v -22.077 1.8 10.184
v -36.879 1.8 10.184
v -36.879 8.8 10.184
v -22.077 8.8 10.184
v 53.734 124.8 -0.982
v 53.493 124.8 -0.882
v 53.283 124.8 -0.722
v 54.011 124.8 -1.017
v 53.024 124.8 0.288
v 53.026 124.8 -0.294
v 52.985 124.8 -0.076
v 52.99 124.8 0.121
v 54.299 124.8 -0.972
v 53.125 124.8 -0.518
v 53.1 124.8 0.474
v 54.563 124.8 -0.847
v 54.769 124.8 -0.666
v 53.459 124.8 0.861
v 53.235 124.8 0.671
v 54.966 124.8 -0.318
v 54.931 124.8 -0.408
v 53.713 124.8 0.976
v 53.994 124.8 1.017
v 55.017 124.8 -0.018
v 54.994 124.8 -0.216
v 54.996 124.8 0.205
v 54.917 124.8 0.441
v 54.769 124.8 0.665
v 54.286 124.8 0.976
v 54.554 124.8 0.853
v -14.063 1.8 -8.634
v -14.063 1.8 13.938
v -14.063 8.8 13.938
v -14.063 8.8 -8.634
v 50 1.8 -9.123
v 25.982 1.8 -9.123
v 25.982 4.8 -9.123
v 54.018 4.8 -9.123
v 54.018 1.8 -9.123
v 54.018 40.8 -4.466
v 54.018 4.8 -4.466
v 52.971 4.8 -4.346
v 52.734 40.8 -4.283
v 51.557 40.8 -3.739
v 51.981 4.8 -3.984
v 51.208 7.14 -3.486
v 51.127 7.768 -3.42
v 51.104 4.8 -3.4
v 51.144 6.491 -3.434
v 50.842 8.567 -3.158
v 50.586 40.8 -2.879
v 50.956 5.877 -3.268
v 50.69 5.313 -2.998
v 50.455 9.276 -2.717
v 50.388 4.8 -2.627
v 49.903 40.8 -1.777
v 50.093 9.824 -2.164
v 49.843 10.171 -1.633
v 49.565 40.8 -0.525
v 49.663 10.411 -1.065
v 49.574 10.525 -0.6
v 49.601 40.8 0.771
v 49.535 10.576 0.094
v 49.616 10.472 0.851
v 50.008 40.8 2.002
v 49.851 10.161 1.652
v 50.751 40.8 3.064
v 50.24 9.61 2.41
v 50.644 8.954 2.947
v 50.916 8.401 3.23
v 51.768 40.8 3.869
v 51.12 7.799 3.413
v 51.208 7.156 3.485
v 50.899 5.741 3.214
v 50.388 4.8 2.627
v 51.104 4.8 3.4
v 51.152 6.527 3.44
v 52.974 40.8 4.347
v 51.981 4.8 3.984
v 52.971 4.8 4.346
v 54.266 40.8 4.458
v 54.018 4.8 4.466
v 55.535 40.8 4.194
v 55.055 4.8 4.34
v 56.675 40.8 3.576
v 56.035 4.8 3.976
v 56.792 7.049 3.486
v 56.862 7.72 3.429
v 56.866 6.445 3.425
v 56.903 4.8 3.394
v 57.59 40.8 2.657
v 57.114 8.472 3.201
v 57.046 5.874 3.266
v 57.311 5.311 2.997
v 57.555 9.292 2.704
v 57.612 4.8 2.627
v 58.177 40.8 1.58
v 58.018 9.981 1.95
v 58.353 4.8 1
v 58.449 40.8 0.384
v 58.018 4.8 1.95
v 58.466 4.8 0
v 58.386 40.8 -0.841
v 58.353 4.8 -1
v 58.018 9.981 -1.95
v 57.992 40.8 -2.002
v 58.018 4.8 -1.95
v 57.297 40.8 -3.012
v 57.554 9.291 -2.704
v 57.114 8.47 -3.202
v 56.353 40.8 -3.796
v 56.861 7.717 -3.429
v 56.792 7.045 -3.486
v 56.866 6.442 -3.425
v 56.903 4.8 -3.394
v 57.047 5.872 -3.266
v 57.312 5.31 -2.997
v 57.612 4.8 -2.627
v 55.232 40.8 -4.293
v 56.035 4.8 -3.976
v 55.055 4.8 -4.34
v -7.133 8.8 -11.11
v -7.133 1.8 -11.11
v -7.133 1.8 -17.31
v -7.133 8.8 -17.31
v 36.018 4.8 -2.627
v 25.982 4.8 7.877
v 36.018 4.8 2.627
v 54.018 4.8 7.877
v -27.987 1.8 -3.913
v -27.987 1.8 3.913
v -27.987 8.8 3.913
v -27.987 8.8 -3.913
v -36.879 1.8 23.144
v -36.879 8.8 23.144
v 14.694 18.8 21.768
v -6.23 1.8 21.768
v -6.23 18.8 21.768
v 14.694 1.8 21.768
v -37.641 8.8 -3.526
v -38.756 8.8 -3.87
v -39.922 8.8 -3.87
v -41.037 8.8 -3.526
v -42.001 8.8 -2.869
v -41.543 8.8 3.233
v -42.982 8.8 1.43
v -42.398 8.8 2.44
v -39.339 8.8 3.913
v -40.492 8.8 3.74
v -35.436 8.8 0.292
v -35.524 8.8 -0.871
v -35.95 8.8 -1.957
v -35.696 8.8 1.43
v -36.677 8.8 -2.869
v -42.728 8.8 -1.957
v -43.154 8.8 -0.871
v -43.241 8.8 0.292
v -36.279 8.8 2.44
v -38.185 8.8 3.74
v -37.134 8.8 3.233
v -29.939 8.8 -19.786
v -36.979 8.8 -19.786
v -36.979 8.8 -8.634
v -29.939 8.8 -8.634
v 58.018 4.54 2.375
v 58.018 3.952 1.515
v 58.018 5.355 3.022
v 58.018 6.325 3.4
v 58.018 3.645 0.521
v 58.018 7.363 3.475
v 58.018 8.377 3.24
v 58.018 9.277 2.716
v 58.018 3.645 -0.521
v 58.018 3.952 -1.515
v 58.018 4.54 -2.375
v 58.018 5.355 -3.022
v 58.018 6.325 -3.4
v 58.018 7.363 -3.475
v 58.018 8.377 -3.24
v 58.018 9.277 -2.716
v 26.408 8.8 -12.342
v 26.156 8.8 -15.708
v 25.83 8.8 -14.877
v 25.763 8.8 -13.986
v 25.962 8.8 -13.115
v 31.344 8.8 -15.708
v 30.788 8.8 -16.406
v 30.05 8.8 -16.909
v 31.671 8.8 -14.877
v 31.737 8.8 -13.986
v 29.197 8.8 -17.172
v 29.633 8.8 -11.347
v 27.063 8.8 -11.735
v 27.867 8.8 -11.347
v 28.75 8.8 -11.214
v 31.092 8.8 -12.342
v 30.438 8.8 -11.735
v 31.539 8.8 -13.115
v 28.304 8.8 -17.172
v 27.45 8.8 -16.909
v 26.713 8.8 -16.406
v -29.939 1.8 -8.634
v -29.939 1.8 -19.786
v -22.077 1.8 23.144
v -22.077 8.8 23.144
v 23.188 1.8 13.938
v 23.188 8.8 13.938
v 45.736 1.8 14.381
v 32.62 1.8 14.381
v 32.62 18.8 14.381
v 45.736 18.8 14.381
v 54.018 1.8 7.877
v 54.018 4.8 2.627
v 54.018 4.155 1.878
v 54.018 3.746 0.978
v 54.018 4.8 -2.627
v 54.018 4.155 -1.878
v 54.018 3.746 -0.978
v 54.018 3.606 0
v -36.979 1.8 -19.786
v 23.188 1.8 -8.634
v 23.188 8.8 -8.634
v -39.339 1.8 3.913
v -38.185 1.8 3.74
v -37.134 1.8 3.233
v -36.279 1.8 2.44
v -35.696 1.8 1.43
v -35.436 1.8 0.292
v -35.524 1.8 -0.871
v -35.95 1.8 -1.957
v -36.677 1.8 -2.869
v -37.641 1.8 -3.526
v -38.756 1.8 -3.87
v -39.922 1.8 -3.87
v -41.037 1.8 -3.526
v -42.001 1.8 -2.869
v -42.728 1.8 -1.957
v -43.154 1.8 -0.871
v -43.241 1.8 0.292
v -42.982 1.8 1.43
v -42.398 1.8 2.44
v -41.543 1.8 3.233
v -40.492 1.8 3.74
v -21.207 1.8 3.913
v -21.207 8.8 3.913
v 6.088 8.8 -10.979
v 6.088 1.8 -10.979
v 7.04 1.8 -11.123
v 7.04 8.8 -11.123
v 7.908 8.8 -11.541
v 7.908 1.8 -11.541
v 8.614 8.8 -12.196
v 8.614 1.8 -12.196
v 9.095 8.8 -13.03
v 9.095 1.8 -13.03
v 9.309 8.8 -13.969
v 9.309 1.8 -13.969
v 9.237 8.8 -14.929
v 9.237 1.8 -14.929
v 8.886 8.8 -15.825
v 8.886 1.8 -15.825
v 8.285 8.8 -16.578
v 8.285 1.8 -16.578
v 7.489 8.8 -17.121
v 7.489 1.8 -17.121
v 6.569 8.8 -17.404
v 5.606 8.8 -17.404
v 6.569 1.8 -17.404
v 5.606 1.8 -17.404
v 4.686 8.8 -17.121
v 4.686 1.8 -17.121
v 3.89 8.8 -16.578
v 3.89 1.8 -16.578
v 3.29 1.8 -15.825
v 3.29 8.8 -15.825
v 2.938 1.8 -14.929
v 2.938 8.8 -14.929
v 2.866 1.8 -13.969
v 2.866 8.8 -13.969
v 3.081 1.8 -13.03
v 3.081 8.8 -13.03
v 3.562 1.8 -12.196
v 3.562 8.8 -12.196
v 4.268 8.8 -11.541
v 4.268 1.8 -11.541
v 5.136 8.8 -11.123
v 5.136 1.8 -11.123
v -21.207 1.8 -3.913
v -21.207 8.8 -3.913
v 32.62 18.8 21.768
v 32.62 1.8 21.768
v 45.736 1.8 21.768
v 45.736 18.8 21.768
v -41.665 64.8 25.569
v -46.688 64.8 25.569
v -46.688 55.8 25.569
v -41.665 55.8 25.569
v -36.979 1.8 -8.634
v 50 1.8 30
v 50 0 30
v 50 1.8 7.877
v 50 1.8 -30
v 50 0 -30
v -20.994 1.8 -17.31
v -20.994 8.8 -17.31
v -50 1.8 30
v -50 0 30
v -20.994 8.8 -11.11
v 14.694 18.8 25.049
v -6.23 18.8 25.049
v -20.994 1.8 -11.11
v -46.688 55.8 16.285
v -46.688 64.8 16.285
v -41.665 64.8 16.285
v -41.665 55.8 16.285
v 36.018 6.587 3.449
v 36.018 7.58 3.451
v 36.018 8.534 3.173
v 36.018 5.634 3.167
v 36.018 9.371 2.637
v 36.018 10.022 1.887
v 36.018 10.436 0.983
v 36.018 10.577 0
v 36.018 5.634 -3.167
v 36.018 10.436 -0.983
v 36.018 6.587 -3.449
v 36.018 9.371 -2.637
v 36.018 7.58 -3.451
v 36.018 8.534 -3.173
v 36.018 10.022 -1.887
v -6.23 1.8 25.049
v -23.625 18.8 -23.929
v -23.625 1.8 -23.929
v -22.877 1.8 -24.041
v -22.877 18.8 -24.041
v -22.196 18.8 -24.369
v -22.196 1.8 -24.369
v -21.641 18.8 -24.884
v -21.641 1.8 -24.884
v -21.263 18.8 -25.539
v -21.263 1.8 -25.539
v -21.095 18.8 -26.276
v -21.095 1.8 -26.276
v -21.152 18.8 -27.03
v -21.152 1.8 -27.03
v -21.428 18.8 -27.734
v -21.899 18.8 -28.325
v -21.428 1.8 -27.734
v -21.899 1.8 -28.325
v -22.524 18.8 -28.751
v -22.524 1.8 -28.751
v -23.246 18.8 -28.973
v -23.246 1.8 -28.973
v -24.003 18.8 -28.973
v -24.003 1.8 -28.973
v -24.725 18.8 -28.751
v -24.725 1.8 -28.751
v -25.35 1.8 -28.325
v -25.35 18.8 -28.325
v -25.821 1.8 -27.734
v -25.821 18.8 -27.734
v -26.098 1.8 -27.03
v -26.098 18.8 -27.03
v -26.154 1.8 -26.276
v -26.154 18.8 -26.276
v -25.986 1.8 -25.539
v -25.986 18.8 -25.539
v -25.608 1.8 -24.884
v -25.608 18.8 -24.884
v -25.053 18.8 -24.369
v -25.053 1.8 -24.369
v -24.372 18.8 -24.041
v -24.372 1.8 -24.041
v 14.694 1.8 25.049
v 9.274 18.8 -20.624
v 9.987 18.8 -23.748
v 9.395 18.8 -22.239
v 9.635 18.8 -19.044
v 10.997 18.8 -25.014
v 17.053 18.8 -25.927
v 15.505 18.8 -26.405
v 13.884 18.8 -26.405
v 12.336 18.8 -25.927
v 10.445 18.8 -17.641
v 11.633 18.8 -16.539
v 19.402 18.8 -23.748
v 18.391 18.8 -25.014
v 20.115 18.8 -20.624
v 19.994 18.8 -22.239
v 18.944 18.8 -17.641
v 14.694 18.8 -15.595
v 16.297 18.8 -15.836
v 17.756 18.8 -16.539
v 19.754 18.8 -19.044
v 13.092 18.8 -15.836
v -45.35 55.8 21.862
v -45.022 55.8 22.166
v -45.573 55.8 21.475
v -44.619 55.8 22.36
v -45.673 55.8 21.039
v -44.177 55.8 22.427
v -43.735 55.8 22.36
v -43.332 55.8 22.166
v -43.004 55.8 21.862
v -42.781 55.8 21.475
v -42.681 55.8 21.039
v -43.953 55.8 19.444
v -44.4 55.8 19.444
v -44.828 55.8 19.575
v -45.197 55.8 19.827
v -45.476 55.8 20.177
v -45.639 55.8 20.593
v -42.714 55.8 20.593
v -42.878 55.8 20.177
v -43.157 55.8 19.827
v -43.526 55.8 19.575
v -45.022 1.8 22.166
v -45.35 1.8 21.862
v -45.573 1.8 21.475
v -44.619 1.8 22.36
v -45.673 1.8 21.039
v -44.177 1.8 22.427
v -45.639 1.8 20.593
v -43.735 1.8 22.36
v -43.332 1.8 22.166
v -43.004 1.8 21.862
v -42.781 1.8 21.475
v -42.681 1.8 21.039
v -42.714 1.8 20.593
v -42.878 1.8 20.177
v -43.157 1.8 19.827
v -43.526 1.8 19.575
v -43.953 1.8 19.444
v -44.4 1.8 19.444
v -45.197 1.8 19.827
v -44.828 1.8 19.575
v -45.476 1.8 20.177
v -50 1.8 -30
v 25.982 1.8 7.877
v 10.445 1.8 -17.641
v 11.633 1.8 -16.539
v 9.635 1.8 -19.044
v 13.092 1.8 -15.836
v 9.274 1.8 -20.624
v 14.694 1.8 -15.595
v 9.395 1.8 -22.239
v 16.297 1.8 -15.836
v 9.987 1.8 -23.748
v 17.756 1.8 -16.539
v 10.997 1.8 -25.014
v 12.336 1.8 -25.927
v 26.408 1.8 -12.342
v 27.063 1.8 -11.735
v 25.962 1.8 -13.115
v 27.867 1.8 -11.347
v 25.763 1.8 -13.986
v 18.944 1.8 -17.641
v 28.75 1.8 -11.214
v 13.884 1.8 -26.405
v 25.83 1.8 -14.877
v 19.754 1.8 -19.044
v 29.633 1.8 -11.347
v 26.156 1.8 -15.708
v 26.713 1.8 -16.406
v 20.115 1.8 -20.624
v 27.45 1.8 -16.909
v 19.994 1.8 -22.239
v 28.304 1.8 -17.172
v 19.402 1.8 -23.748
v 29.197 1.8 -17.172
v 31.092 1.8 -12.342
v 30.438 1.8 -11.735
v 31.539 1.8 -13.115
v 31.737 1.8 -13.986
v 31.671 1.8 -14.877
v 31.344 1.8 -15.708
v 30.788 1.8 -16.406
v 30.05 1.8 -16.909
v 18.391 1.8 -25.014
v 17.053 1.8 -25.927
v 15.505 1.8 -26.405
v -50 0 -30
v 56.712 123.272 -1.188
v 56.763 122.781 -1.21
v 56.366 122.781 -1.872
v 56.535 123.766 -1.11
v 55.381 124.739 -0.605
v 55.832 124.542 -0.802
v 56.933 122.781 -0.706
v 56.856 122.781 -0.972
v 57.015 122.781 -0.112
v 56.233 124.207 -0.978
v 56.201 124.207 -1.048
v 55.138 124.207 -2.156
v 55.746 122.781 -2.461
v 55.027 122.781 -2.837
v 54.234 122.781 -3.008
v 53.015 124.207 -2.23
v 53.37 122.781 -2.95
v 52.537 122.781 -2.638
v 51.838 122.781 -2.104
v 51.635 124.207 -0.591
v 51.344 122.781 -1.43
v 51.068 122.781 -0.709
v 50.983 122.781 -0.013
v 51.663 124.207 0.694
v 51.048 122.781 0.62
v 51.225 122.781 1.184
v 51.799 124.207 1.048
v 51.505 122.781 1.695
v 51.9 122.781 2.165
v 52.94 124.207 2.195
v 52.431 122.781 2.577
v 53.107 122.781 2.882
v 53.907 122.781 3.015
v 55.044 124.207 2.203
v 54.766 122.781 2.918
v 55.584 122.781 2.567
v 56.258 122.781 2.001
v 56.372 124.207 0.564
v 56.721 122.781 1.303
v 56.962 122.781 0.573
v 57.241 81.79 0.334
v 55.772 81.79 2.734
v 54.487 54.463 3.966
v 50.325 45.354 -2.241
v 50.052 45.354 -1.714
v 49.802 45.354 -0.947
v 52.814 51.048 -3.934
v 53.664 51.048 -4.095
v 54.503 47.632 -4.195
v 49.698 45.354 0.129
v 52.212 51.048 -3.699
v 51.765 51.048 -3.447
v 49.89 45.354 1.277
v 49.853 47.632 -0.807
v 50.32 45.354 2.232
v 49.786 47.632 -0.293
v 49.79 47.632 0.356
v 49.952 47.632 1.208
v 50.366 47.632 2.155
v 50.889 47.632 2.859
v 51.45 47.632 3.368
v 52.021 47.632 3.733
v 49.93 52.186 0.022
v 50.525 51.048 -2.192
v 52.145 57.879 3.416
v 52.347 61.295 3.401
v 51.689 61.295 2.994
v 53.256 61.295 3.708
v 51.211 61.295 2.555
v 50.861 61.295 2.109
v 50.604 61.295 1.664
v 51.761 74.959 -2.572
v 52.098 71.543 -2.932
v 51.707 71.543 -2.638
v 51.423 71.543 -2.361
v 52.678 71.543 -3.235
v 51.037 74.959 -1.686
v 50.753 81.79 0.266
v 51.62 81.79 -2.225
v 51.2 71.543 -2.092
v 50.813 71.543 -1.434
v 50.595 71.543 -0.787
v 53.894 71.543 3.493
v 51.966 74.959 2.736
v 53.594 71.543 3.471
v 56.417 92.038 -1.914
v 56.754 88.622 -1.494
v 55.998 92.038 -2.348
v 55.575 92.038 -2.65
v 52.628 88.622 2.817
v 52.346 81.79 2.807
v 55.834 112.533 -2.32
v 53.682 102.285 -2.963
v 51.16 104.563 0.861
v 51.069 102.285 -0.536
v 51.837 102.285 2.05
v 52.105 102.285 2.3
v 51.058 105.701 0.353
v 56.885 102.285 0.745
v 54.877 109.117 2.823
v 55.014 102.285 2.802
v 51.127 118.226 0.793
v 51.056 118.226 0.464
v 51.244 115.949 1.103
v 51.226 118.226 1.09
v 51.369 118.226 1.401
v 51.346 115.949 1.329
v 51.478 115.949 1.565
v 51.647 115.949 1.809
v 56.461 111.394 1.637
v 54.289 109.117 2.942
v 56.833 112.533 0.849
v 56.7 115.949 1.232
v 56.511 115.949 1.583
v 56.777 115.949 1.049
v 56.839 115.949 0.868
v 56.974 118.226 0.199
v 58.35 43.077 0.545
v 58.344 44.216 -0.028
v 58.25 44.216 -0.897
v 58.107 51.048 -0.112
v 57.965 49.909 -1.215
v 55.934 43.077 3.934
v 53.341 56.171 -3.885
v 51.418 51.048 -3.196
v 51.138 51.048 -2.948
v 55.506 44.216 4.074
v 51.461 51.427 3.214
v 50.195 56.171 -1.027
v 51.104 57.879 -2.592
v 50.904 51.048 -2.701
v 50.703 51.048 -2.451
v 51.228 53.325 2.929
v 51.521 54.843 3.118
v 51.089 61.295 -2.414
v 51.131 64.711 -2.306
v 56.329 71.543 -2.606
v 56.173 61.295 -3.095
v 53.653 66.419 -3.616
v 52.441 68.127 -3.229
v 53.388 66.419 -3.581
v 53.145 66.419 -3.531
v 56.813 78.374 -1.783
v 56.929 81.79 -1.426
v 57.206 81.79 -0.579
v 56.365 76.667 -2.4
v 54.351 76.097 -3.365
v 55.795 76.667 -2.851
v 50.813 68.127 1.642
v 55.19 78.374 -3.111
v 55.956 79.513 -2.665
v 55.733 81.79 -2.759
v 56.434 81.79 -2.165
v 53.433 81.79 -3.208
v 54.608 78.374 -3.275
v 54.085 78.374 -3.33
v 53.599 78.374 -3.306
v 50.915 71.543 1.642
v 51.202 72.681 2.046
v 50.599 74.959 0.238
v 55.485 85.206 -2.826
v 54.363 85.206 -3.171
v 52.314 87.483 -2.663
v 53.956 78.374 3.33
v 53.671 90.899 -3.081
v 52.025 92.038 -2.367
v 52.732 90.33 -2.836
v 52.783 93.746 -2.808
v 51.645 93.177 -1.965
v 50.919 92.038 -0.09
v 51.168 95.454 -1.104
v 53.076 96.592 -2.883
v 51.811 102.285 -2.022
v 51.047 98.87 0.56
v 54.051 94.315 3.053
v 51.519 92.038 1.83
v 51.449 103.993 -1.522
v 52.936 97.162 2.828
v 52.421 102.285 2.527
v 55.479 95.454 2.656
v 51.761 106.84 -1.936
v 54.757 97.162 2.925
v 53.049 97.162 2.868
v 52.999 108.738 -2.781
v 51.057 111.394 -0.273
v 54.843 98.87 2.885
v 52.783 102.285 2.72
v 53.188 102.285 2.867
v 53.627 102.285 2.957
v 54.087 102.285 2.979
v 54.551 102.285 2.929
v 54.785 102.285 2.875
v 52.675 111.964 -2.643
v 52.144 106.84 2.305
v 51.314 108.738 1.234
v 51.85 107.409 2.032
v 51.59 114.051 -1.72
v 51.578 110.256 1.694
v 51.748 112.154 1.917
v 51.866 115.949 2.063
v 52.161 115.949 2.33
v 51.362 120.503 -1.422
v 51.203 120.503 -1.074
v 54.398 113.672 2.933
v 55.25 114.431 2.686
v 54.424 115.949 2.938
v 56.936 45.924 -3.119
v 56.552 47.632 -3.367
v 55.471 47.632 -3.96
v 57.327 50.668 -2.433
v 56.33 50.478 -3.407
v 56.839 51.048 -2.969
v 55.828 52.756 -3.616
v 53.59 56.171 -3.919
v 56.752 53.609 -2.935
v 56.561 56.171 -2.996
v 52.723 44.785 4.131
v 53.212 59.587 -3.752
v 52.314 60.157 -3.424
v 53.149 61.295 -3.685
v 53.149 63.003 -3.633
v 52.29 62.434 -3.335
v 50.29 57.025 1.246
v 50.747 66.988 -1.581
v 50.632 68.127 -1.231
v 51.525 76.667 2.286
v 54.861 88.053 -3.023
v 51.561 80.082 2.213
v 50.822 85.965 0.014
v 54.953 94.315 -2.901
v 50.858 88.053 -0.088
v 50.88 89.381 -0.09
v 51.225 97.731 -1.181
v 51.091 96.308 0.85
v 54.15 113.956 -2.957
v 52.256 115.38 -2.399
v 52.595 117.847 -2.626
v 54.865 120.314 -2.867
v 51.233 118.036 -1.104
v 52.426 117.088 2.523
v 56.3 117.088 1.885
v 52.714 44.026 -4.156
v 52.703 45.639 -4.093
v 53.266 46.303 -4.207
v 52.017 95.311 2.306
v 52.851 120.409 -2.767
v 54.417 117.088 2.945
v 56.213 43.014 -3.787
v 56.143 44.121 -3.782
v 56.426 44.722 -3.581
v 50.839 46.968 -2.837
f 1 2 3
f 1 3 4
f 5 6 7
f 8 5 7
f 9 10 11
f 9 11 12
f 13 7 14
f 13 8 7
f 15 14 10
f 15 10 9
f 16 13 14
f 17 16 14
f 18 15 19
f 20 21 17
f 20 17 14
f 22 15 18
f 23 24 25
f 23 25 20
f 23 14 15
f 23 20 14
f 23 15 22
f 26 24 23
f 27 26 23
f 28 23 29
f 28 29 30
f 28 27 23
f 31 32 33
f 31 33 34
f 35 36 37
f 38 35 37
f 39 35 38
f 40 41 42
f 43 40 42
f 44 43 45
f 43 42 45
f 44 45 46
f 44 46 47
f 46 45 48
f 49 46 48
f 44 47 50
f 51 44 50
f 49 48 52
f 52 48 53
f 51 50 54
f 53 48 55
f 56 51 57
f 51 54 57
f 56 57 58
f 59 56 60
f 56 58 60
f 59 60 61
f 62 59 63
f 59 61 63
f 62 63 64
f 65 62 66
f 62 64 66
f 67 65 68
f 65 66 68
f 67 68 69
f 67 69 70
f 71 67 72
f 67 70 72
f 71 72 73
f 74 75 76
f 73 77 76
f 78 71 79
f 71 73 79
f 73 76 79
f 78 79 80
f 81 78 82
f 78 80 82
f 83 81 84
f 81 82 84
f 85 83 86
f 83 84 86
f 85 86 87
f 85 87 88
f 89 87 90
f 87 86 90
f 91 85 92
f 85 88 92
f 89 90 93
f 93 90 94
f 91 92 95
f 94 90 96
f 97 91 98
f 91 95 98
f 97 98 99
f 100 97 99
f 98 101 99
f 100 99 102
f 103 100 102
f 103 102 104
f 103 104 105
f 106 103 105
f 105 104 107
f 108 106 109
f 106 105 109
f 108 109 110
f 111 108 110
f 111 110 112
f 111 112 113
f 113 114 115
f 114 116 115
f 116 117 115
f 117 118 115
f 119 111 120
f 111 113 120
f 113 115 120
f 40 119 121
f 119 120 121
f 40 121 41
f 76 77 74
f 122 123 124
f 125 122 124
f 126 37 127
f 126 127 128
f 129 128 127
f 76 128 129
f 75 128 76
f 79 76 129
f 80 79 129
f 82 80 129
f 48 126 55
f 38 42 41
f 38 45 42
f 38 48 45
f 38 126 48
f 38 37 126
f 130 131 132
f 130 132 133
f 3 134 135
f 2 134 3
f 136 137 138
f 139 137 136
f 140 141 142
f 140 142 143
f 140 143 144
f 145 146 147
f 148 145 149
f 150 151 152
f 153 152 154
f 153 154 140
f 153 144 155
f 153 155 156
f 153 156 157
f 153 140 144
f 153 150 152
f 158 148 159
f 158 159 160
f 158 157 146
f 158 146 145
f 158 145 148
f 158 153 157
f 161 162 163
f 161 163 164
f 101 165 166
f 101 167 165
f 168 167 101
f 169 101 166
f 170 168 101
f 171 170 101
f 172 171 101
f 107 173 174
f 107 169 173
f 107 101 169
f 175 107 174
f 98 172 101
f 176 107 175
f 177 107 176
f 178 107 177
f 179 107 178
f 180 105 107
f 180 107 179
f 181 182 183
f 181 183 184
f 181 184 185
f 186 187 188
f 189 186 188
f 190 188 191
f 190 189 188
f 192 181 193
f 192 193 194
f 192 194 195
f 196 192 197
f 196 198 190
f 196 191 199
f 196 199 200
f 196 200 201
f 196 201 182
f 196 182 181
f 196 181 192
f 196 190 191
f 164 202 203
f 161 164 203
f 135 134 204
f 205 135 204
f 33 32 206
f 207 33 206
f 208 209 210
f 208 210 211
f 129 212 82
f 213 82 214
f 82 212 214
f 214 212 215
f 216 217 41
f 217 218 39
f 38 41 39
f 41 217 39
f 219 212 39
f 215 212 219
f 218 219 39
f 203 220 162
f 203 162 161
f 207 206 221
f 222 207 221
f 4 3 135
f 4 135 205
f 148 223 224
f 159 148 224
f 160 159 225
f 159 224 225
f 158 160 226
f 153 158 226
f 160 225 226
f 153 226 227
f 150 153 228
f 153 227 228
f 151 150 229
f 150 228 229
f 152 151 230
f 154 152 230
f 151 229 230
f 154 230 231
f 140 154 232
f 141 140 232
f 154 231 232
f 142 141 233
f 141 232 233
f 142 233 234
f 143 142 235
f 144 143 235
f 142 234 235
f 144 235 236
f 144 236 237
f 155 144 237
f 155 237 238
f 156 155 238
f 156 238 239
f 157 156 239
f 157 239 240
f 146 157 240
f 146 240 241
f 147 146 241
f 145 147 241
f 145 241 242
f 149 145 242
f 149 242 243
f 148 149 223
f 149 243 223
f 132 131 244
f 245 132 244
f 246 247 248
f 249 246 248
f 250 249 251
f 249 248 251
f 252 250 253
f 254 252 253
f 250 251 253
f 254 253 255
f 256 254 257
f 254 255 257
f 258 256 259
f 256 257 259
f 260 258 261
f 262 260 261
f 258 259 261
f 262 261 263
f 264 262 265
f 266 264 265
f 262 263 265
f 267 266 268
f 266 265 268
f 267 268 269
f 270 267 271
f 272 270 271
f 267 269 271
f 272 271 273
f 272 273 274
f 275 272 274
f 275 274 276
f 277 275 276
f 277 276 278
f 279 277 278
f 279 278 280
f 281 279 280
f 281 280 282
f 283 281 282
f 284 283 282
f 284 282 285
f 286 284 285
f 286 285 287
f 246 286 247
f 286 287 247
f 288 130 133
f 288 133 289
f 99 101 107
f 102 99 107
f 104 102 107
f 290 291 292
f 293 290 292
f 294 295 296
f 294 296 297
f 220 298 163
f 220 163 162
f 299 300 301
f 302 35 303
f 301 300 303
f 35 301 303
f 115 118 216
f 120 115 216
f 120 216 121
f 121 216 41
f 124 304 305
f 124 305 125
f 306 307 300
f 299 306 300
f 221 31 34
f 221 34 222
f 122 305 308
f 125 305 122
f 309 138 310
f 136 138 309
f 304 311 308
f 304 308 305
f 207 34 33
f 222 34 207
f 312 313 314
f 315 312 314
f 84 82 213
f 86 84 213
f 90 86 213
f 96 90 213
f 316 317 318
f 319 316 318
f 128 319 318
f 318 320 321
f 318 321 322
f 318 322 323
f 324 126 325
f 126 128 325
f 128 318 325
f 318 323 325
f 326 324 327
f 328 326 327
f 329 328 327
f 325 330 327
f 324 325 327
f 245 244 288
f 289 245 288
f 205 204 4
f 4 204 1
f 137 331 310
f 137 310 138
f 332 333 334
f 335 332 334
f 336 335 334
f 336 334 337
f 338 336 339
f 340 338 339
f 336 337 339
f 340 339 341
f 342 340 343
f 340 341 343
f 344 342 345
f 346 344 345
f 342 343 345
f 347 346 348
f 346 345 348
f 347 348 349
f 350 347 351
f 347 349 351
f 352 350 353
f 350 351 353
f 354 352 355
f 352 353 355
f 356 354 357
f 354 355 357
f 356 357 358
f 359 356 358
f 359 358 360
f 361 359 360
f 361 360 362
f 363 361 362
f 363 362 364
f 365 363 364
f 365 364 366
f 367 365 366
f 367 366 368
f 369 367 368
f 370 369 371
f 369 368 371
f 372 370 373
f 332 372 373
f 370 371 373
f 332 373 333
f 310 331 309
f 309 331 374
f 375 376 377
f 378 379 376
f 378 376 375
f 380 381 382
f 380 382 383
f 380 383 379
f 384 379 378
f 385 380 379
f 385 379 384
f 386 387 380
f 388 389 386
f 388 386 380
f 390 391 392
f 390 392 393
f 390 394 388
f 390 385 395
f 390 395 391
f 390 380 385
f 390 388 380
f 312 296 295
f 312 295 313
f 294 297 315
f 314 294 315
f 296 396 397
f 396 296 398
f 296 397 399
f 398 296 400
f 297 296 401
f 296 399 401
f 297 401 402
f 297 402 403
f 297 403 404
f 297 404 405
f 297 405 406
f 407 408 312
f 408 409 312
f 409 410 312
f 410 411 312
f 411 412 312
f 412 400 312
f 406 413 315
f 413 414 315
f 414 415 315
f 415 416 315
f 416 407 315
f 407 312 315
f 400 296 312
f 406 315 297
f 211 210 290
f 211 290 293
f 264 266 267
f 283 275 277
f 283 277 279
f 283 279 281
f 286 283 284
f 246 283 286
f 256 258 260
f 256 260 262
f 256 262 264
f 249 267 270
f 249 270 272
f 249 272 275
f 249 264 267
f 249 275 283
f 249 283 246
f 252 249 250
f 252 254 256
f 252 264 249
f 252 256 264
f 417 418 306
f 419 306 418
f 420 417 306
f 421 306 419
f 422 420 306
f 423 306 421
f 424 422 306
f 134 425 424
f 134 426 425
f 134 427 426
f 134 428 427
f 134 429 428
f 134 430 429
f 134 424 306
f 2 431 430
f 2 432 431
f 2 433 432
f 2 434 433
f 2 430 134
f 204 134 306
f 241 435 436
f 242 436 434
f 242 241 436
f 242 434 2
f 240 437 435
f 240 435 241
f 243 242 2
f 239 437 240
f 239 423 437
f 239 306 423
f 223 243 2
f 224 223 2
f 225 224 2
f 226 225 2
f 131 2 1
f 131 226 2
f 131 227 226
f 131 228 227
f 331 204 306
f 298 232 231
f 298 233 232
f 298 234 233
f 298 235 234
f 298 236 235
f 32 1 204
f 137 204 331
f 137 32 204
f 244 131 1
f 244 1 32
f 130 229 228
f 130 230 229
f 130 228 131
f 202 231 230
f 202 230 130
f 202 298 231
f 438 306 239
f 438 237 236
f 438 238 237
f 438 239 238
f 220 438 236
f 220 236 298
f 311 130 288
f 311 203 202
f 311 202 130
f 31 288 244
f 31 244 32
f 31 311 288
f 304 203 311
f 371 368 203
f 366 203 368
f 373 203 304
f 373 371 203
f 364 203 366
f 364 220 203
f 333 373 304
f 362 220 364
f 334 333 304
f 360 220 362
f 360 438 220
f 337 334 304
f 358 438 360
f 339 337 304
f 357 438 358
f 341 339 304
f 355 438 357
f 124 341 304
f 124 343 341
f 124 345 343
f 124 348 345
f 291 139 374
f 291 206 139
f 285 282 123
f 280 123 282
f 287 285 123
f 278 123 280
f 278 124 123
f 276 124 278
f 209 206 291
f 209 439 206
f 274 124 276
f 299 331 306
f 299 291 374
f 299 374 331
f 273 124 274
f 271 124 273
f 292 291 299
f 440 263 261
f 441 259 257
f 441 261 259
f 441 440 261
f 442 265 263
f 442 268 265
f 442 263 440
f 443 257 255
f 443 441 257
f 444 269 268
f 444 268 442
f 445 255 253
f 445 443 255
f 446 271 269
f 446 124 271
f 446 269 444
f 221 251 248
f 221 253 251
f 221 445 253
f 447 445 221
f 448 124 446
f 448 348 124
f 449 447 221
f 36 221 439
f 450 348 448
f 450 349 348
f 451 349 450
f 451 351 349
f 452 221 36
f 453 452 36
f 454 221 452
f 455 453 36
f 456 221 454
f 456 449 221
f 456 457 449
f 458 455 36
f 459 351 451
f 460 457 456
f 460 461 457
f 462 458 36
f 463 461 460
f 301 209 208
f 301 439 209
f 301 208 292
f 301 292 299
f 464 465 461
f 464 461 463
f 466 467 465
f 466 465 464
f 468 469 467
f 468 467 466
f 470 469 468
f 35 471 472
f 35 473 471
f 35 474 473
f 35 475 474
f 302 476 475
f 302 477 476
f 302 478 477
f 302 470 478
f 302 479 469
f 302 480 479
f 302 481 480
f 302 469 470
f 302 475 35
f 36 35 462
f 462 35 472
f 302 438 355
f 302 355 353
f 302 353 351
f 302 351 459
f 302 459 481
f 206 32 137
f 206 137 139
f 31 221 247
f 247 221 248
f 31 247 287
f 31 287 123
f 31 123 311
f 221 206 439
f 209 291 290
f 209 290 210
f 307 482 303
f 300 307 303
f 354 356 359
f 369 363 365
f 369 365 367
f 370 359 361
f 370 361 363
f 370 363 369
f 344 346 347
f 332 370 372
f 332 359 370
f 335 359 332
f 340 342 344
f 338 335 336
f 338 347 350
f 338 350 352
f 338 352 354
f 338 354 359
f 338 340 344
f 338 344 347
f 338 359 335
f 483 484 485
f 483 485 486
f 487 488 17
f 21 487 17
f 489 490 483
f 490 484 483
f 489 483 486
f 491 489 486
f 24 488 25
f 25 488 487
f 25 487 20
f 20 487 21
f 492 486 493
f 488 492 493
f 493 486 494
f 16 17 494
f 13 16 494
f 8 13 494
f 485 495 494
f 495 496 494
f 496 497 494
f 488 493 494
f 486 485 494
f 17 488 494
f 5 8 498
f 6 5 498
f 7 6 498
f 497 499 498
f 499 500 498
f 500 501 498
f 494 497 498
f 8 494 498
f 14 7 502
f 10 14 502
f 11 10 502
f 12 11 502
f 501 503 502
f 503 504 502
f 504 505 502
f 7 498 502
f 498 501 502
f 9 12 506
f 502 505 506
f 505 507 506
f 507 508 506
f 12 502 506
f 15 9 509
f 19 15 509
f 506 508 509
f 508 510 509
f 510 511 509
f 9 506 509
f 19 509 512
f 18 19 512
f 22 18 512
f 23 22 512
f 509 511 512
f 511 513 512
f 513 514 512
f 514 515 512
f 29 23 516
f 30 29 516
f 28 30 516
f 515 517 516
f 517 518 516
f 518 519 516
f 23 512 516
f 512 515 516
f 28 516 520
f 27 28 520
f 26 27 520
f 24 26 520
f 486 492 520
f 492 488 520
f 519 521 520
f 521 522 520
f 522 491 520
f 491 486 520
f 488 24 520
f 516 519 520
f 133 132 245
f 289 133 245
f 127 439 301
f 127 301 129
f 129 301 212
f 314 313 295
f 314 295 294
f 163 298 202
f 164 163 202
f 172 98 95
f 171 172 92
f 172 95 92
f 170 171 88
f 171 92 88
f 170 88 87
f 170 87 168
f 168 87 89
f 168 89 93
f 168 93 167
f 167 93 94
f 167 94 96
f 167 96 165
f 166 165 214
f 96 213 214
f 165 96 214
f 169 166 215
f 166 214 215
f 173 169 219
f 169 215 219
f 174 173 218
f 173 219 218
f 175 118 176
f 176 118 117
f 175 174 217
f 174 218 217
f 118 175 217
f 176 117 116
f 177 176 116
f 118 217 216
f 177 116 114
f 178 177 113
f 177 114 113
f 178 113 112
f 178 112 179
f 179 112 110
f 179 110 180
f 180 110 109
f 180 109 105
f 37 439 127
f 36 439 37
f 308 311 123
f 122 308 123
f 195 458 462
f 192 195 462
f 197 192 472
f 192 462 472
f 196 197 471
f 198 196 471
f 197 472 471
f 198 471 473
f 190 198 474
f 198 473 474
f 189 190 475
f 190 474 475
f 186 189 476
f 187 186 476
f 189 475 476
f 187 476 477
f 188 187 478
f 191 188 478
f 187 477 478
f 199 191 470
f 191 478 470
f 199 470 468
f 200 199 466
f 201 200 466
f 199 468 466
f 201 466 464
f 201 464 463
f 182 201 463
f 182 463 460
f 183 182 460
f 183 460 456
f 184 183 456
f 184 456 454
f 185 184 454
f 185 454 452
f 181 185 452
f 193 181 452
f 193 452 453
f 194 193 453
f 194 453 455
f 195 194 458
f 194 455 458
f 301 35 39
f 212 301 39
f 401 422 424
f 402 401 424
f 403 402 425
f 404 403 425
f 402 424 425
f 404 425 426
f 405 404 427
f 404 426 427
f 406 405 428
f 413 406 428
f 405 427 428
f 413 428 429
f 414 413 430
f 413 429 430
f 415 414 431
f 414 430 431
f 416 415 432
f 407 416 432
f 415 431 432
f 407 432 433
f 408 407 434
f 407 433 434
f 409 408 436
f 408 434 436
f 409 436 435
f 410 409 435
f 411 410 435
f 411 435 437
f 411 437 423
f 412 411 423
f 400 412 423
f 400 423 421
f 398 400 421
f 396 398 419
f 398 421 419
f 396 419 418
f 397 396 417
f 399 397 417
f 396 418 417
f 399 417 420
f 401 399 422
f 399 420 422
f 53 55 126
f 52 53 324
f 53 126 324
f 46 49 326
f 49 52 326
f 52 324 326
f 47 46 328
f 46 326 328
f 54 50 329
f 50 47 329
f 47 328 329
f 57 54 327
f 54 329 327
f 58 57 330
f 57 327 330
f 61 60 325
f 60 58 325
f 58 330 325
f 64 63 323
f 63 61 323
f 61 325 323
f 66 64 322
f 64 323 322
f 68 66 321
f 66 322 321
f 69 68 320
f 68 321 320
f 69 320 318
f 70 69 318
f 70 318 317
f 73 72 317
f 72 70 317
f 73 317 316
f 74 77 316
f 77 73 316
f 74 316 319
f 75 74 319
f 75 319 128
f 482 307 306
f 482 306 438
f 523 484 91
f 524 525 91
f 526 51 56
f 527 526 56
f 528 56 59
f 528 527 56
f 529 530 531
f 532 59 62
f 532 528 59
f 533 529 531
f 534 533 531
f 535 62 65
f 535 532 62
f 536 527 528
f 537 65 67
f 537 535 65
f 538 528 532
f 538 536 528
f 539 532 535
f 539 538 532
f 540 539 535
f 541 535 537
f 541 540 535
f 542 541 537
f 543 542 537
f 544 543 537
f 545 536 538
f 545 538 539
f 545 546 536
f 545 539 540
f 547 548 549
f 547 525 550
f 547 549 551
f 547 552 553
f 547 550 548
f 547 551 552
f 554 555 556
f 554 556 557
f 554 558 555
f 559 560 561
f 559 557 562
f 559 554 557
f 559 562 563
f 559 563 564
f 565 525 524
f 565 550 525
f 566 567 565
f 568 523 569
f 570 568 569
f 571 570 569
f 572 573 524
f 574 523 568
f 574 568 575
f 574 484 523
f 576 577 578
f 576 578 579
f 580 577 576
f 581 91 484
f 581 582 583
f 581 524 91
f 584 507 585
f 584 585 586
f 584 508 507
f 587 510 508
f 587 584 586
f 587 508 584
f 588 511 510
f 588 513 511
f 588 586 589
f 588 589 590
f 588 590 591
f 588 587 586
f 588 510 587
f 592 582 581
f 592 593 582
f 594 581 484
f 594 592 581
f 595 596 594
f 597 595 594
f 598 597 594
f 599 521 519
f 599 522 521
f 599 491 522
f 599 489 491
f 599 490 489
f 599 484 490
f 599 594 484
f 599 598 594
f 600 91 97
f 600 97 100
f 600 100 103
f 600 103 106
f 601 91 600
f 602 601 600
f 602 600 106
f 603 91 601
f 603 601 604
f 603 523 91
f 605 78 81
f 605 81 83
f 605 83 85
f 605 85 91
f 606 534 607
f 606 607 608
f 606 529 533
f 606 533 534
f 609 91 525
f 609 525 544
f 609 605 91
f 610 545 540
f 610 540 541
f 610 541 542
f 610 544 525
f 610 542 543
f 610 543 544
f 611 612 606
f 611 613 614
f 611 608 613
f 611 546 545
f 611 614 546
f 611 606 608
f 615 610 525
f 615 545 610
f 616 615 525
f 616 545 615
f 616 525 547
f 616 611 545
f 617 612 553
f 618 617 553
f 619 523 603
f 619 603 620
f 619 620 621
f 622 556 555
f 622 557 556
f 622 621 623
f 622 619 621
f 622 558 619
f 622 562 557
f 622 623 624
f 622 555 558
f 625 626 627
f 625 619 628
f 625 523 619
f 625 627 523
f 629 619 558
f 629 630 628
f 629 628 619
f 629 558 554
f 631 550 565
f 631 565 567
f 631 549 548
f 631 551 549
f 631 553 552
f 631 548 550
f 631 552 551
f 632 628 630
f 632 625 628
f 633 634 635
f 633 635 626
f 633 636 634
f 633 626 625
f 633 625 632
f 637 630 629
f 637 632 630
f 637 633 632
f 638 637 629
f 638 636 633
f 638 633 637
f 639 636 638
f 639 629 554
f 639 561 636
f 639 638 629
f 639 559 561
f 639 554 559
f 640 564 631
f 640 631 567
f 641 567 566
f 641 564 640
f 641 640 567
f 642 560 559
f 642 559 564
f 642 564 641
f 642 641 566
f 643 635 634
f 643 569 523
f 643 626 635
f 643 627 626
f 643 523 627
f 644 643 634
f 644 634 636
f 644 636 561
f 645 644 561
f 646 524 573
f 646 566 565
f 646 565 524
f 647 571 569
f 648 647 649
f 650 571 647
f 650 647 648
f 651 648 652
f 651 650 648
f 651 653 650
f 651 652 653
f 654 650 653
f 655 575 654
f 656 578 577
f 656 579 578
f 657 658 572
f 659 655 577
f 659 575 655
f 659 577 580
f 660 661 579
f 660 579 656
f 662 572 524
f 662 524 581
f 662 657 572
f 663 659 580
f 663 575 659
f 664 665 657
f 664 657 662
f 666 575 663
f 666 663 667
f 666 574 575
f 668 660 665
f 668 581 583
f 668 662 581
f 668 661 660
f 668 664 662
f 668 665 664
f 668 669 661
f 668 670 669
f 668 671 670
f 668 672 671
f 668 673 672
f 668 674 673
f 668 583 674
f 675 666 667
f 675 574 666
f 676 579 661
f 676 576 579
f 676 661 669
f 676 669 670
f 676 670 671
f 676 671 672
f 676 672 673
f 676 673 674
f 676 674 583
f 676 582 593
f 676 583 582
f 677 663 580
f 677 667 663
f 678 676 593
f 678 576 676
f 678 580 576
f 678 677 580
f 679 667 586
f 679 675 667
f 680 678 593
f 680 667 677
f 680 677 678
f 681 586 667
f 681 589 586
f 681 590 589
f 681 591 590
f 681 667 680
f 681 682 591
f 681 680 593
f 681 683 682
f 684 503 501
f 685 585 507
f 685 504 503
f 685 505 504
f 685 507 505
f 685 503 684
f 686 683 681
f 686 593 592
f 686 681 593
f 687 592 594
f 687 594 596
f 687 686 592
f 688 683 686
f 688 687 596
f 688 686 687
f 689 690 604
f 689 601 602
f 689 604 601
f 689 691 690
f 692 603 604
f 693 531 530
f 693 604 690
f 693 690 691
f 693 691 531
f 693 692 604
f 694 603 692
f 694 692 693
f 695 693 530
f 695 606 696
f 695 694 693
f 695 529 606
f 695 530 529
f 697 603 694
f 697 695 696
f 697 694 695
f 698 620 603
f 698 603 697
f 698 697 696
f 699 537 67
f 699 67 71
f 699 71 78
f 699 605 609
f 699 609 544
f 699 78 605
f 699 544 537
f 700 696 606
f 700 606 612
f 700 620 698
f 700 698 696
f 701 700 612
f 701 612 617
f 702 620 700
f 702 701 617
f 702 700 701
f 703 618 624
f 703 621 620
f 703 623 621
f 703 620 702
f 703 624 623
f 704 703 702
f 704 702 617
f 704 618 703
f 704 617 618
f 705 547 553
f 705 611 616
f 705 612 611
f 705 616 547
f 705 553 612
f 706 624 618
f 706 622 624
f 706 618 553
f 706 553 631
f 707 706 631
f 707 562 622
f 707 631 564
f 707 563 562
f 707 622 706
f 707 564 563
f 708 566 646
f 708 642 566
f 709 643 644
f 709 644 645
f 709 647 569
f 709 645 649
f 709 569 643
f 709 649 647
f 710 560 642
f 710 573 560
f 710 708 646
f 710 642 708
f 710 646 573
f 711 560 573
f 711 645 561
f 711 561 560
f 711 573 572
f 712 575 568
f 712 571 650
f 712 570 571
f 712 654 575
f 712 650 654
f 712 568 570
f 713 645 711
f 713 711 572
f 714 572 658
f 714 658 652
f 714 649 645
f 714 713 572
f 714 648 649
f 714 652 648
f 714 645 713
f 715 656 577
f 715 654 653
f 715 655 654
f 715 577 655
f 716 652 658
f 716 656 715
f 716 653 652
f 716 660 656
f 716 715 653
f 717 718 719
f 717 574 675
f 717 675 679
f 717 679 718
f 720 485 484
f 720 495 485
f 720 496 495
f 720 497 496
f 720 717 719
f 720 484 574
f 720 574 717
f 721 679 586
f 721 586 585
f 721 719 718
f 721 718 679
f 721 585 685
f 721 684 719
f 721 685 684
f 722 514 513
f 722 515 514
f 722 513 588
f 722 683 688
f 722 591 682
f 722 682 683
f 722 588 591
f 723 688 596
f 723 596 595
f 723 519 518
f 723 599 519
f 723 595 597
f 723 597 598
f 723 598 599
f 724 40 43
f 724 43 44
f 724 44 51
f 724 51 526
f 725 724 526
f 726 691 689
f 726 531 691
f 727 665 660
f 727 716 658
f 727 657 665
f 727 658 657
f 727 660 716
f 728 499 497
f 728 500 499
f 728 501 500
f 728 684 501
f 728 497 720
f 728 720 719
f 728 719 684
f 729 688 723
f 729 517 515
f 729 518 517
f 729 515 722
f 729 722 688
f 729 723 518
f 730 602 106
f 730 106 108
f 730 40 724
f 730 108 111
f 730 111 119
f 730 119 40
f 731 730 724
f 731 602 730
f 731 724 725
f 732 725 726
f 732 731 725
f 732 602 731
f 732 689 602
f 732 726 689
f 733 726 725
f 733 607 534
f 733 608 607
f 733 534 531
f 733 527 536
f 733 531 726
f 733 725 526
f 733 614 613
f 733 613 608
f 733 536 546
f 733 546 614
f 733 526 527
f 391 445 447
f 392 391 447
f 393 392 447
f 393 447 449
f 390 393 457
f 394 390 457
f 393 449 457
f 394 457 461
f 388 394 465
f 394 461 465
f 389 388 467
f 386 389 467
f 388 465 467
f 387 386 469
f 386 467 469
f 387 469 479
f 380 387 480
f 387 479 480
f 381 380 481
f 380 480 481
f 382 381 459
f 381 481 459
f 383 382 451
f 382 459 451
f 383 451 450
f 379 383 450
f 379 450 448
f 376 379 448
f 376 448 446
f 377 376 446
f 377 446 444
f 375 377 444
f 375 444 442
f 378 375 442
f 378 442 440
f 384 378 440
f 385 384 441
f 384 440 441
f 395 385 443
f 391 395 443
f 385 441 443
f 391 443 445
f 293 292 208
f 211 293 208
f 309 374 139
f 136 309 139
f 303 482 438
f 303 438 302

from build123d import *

# Parameters (mm, degrees)
SKETCH_1_W           = 100
SKETCH_1_H           = 60
EXTRUDE_1_DEPTH      = 1.8
SKETCH_2_W           = 28.035932228
SKETCH_2_H           = 17
EXTRUDE_2_DEPTH      = 3
SKETCH_3_R           = 4.4660261
EXTRUDE_3_DEPTH      = 36
FILLET_1_R           = 2
EXTRUDE_4_DEPTH      = 4
EXTRUDE_4_DEPTH_BACK = 18
SKETCH_5_R           = 3.485899794
SKETCH_6_R           = 1.5
EXTRUDE_5_DEPTH      = 54
SKETCH_7_W           = 5.022784178
SKETCH_7_H           = 9.283620646
EXTRUDE_6_DEPTH      = 9
SKETCH_8_R           = 2.995676271
SKETCH_8_R_2         = 3.913381196
SKETCH_8_R_3         = 3.23055129
SKETCH_8_W           = 14.80227989
SKETCH_8_H           = 12.960220437
SKETCH_8_W_2         = 37.251391954
SKETCH_8_H_2         = 22.572187892
SKETCH_8_W_3         = 7.03946311
SKETCH_8_H_3         = 11.152107008
SKETCH_8_W_4         = 13.860680023
SKETCH_8_H_4         = 6.200099882
SKETCH_8_W_5         = 6.780047866
SKETCH_8_H_5         = 7.826762392
EXTRUDE_7_DEPTH      = 7
SKETCH_9_R           = 5.435360368
SKETCH_9_R_2         = 2.536600753
SKETCH_9_W           = 13.115606058
SKETCH_9_H           = 7.387065748
SKETCH_9_W_2         = 20.924425377
SKETCH_9_H_2         = 3.280564091
EXTRUDE_8_DEPTH      = 17


with BuildPart() as part:
    # 草图1 → 凸台-拉伸1 (new body)
    with BuildSketch(Plane(origin=(0, 0, 0), x_dir=(1, 0, 0), z_dir=(0, 1, 0))):
        Rectangle(SKETCH_1_W, SKETCH_1_H)
    extrude(amount=EXTRUDE_1_DEPTH)

    # 草图2 → 凸台-拉伸2 (add)
    with BuildSketch(Plane(origin=(0, 1.8, 0), x_dir=(1, 0, 0), z_dir=(0, 1, 0))):
        with Locations((40, 0.62339544)):
            Rectangle(SKETCH_2_W, SKETCH_2_H)
    extrude(amount=EXTRUDE_2_DEPTH)

    # 草图3 → 凸台-拉伸3 (add)
    with BuildSketch(Plane(origin=(0, 4.8, 0), x_dir=(1, 0, 0), z_dir=(0, 1, 0))):
        with Locations(Location((54, 0, 0), (0, 0, 89.769507549))):
            Circle(SKETCH_3_R)
    extrude(amount=EXTRUDE_3_DEPTH)

    # 放样1: read off the stored shape, not the designer's step
    # 放样1: loft between two sections, ruled curve by curve
    loft_1_from = [
        Edge.make_bspline([(57.589860253, 40.8, 2.656744716), (62.903349686, 40.8, -4.52297579), (55.72362918, 40.8, -9.836465222), (50.410139747, 40.8, -2.656744716), (45.096650314, 40.8, 4.52297579), (52.27637082, 40.8, 9.836465222), (57.589860253, 40.8, 2.656744716)], [0, 0, 0, 0, 0.5, 0.5, 0.5, 1, 1, 1, 1], 3, [1, 0.333333333, 0.333333333, 1, 0.333333333, 0.333333333, 1]),
    ]
    loft_1_to = [
        Edge.make_bspline([(56.743086688, 124.8, -1.30542509), (54.132236508, 124.8, -6.791598467), (48.646063131, 124.8, -4.180748287), (51.256913312, 124.8, 1.30542509), (53.867763492, 124.8, 6.791598467), (59.353936869, 124.8, 4.180748287), (56.743086688, 124.8, -1.30542509)], [0, 0, 0, 0, 0.5, 0.5, 0.5, 1, 1, 1, 1], 3, [1, 0.333333333, 0.333333333, 1, 0.333333333, 0.333333333, 1]),
    ]
    loft_1 = Solid(Shell([*[Face.make_surface_from_curves(loft_1_from[k], loft_1_to[k]) for k in range(1)], Face(Wire(loft_1_from)), Face(Wire(loft_1_to))]))
    add(loft_1)

    # 圆角1
    fillet_1_edges = [part.edges().sort_by_distance(p)[0] for p in [
        (51.256913312, 124.8, 1.30542509),
    ]]
    fillet(fillet_1_edges, radius=FILLET_1_R)

    # 草图5 → 凸台-拉伸4 (add, two sides: drawn at the far end of the back side and taken through both)
    with BuildSketch(Plane(origin=(54.017966114, 0, 0), x_dir=(0, 0, -1), z_dir=(1, 0, 0)).offset(-EXTRUDE_4_DEPTH_BACK)):
        with Locations((0, 7.091500567)):
            Circle(SKETCH_5_R)
    extrude(amount=EXTRUDE_4_DEPTH + EXTRUDE_4_DEPTH_BACK)

    # 草图6 → 凸台-拉伸5 (add)
    with BuildSketch(Plane(origin=(0, 1.8, 0), x_dir=(1, 0, 0), z_dir=(0, 1, 0))):
        with Locations(Location((-44.176840226, -20.926898996, 0), (0, 0, 270))):
            Circle(SKETCH_6_R)
    extrude(amount=EXTRUDE_5_DEPTH)

    # 草图7 → 凸台-拉伸6 (add)
    with BuildSketch(Plane(origin=(0, 55.8, 0), x_dir=(1, 0, 0), z_dir=(0, 1, 0))):
        with Locations((-44.176840226, -20.926898996)):
            Rectangle(SKETCH_7_W, SKETCH_7_H)
    extrude(amount=EXTRUDE_6_DEPTH)

    # 草图8 → 凸台-拉伸7 (add)
    with BuildSketch(Plane(origin=(0, 1.8, 0), x_dir=(1, 0, 0), z_dir=(0, 1, 0))):
        with Locations(Location((28.750153934, 14.209939116, 0), (0, 0, 270))):
            Circle(SKETCH_8_R)
        with Locations(Location((-39.338854446, 0, 0), (0, 0, 270))):
            Circle(SKETCH_8_R_2)
        with Locations(Location((6.087776547, 14.209939116, 0), (0, 0, 270))):
            Circle(SKETCH_8_R_3)
        with Locations((-29.478201176, -16.663954757)):
            Rectangle(SKETCH_8_W, SKETCH_8_H)
        with Locations((4.562248459, -2.652208334)):
            Rectangle(SKETCH_8_W_2, SKETCH_8_H_2)
        with Locations((-33.458891008, 14.209939116)):
            Rectangle(SKETCH_8_W_3, SKETCH_8_H_3)
        with Locations((-14.063447519, 14.209939116)):
            Rectangle(SKETCH_8_W_4, SKETCH_8_H_4)
        with Locations((-24.597460964, 0)):
            Rectangle(SKETCH_8_W_5, SKETCH_8_H_5)
    extrude(amount=EXTRUDE_7_DEPTH)

    # 草图9 → 凸台-拉伸8 (add)
    with BuildSketch(Plane(origin=(0, 1.8, 0), x_dir=(1, 0, 0), z_dir=(0, 1, 0))):
        with Locations(Location((14.694438418, 21.029865225, 0), (0, 0, 270))):
            Circle(SKETCH_9_R)
        with Locations(Location((-23.624550245, 26.465225593, 0), (0, 0, 270))):
            Circle(SKETCH_9_R_2)
        with Locations((39.178063873, -18.07482194)):
            Rectangle(SKETCH_9_W, SKETCH_9_H)
        with Locations((4.232225729, -23.408636859)):
            Rectangle(SKETCH_9_W_2, SKETCH_9_H_2)
    extrude(amount=EXTRUDE_8_DEPTH)


solid = part.part
